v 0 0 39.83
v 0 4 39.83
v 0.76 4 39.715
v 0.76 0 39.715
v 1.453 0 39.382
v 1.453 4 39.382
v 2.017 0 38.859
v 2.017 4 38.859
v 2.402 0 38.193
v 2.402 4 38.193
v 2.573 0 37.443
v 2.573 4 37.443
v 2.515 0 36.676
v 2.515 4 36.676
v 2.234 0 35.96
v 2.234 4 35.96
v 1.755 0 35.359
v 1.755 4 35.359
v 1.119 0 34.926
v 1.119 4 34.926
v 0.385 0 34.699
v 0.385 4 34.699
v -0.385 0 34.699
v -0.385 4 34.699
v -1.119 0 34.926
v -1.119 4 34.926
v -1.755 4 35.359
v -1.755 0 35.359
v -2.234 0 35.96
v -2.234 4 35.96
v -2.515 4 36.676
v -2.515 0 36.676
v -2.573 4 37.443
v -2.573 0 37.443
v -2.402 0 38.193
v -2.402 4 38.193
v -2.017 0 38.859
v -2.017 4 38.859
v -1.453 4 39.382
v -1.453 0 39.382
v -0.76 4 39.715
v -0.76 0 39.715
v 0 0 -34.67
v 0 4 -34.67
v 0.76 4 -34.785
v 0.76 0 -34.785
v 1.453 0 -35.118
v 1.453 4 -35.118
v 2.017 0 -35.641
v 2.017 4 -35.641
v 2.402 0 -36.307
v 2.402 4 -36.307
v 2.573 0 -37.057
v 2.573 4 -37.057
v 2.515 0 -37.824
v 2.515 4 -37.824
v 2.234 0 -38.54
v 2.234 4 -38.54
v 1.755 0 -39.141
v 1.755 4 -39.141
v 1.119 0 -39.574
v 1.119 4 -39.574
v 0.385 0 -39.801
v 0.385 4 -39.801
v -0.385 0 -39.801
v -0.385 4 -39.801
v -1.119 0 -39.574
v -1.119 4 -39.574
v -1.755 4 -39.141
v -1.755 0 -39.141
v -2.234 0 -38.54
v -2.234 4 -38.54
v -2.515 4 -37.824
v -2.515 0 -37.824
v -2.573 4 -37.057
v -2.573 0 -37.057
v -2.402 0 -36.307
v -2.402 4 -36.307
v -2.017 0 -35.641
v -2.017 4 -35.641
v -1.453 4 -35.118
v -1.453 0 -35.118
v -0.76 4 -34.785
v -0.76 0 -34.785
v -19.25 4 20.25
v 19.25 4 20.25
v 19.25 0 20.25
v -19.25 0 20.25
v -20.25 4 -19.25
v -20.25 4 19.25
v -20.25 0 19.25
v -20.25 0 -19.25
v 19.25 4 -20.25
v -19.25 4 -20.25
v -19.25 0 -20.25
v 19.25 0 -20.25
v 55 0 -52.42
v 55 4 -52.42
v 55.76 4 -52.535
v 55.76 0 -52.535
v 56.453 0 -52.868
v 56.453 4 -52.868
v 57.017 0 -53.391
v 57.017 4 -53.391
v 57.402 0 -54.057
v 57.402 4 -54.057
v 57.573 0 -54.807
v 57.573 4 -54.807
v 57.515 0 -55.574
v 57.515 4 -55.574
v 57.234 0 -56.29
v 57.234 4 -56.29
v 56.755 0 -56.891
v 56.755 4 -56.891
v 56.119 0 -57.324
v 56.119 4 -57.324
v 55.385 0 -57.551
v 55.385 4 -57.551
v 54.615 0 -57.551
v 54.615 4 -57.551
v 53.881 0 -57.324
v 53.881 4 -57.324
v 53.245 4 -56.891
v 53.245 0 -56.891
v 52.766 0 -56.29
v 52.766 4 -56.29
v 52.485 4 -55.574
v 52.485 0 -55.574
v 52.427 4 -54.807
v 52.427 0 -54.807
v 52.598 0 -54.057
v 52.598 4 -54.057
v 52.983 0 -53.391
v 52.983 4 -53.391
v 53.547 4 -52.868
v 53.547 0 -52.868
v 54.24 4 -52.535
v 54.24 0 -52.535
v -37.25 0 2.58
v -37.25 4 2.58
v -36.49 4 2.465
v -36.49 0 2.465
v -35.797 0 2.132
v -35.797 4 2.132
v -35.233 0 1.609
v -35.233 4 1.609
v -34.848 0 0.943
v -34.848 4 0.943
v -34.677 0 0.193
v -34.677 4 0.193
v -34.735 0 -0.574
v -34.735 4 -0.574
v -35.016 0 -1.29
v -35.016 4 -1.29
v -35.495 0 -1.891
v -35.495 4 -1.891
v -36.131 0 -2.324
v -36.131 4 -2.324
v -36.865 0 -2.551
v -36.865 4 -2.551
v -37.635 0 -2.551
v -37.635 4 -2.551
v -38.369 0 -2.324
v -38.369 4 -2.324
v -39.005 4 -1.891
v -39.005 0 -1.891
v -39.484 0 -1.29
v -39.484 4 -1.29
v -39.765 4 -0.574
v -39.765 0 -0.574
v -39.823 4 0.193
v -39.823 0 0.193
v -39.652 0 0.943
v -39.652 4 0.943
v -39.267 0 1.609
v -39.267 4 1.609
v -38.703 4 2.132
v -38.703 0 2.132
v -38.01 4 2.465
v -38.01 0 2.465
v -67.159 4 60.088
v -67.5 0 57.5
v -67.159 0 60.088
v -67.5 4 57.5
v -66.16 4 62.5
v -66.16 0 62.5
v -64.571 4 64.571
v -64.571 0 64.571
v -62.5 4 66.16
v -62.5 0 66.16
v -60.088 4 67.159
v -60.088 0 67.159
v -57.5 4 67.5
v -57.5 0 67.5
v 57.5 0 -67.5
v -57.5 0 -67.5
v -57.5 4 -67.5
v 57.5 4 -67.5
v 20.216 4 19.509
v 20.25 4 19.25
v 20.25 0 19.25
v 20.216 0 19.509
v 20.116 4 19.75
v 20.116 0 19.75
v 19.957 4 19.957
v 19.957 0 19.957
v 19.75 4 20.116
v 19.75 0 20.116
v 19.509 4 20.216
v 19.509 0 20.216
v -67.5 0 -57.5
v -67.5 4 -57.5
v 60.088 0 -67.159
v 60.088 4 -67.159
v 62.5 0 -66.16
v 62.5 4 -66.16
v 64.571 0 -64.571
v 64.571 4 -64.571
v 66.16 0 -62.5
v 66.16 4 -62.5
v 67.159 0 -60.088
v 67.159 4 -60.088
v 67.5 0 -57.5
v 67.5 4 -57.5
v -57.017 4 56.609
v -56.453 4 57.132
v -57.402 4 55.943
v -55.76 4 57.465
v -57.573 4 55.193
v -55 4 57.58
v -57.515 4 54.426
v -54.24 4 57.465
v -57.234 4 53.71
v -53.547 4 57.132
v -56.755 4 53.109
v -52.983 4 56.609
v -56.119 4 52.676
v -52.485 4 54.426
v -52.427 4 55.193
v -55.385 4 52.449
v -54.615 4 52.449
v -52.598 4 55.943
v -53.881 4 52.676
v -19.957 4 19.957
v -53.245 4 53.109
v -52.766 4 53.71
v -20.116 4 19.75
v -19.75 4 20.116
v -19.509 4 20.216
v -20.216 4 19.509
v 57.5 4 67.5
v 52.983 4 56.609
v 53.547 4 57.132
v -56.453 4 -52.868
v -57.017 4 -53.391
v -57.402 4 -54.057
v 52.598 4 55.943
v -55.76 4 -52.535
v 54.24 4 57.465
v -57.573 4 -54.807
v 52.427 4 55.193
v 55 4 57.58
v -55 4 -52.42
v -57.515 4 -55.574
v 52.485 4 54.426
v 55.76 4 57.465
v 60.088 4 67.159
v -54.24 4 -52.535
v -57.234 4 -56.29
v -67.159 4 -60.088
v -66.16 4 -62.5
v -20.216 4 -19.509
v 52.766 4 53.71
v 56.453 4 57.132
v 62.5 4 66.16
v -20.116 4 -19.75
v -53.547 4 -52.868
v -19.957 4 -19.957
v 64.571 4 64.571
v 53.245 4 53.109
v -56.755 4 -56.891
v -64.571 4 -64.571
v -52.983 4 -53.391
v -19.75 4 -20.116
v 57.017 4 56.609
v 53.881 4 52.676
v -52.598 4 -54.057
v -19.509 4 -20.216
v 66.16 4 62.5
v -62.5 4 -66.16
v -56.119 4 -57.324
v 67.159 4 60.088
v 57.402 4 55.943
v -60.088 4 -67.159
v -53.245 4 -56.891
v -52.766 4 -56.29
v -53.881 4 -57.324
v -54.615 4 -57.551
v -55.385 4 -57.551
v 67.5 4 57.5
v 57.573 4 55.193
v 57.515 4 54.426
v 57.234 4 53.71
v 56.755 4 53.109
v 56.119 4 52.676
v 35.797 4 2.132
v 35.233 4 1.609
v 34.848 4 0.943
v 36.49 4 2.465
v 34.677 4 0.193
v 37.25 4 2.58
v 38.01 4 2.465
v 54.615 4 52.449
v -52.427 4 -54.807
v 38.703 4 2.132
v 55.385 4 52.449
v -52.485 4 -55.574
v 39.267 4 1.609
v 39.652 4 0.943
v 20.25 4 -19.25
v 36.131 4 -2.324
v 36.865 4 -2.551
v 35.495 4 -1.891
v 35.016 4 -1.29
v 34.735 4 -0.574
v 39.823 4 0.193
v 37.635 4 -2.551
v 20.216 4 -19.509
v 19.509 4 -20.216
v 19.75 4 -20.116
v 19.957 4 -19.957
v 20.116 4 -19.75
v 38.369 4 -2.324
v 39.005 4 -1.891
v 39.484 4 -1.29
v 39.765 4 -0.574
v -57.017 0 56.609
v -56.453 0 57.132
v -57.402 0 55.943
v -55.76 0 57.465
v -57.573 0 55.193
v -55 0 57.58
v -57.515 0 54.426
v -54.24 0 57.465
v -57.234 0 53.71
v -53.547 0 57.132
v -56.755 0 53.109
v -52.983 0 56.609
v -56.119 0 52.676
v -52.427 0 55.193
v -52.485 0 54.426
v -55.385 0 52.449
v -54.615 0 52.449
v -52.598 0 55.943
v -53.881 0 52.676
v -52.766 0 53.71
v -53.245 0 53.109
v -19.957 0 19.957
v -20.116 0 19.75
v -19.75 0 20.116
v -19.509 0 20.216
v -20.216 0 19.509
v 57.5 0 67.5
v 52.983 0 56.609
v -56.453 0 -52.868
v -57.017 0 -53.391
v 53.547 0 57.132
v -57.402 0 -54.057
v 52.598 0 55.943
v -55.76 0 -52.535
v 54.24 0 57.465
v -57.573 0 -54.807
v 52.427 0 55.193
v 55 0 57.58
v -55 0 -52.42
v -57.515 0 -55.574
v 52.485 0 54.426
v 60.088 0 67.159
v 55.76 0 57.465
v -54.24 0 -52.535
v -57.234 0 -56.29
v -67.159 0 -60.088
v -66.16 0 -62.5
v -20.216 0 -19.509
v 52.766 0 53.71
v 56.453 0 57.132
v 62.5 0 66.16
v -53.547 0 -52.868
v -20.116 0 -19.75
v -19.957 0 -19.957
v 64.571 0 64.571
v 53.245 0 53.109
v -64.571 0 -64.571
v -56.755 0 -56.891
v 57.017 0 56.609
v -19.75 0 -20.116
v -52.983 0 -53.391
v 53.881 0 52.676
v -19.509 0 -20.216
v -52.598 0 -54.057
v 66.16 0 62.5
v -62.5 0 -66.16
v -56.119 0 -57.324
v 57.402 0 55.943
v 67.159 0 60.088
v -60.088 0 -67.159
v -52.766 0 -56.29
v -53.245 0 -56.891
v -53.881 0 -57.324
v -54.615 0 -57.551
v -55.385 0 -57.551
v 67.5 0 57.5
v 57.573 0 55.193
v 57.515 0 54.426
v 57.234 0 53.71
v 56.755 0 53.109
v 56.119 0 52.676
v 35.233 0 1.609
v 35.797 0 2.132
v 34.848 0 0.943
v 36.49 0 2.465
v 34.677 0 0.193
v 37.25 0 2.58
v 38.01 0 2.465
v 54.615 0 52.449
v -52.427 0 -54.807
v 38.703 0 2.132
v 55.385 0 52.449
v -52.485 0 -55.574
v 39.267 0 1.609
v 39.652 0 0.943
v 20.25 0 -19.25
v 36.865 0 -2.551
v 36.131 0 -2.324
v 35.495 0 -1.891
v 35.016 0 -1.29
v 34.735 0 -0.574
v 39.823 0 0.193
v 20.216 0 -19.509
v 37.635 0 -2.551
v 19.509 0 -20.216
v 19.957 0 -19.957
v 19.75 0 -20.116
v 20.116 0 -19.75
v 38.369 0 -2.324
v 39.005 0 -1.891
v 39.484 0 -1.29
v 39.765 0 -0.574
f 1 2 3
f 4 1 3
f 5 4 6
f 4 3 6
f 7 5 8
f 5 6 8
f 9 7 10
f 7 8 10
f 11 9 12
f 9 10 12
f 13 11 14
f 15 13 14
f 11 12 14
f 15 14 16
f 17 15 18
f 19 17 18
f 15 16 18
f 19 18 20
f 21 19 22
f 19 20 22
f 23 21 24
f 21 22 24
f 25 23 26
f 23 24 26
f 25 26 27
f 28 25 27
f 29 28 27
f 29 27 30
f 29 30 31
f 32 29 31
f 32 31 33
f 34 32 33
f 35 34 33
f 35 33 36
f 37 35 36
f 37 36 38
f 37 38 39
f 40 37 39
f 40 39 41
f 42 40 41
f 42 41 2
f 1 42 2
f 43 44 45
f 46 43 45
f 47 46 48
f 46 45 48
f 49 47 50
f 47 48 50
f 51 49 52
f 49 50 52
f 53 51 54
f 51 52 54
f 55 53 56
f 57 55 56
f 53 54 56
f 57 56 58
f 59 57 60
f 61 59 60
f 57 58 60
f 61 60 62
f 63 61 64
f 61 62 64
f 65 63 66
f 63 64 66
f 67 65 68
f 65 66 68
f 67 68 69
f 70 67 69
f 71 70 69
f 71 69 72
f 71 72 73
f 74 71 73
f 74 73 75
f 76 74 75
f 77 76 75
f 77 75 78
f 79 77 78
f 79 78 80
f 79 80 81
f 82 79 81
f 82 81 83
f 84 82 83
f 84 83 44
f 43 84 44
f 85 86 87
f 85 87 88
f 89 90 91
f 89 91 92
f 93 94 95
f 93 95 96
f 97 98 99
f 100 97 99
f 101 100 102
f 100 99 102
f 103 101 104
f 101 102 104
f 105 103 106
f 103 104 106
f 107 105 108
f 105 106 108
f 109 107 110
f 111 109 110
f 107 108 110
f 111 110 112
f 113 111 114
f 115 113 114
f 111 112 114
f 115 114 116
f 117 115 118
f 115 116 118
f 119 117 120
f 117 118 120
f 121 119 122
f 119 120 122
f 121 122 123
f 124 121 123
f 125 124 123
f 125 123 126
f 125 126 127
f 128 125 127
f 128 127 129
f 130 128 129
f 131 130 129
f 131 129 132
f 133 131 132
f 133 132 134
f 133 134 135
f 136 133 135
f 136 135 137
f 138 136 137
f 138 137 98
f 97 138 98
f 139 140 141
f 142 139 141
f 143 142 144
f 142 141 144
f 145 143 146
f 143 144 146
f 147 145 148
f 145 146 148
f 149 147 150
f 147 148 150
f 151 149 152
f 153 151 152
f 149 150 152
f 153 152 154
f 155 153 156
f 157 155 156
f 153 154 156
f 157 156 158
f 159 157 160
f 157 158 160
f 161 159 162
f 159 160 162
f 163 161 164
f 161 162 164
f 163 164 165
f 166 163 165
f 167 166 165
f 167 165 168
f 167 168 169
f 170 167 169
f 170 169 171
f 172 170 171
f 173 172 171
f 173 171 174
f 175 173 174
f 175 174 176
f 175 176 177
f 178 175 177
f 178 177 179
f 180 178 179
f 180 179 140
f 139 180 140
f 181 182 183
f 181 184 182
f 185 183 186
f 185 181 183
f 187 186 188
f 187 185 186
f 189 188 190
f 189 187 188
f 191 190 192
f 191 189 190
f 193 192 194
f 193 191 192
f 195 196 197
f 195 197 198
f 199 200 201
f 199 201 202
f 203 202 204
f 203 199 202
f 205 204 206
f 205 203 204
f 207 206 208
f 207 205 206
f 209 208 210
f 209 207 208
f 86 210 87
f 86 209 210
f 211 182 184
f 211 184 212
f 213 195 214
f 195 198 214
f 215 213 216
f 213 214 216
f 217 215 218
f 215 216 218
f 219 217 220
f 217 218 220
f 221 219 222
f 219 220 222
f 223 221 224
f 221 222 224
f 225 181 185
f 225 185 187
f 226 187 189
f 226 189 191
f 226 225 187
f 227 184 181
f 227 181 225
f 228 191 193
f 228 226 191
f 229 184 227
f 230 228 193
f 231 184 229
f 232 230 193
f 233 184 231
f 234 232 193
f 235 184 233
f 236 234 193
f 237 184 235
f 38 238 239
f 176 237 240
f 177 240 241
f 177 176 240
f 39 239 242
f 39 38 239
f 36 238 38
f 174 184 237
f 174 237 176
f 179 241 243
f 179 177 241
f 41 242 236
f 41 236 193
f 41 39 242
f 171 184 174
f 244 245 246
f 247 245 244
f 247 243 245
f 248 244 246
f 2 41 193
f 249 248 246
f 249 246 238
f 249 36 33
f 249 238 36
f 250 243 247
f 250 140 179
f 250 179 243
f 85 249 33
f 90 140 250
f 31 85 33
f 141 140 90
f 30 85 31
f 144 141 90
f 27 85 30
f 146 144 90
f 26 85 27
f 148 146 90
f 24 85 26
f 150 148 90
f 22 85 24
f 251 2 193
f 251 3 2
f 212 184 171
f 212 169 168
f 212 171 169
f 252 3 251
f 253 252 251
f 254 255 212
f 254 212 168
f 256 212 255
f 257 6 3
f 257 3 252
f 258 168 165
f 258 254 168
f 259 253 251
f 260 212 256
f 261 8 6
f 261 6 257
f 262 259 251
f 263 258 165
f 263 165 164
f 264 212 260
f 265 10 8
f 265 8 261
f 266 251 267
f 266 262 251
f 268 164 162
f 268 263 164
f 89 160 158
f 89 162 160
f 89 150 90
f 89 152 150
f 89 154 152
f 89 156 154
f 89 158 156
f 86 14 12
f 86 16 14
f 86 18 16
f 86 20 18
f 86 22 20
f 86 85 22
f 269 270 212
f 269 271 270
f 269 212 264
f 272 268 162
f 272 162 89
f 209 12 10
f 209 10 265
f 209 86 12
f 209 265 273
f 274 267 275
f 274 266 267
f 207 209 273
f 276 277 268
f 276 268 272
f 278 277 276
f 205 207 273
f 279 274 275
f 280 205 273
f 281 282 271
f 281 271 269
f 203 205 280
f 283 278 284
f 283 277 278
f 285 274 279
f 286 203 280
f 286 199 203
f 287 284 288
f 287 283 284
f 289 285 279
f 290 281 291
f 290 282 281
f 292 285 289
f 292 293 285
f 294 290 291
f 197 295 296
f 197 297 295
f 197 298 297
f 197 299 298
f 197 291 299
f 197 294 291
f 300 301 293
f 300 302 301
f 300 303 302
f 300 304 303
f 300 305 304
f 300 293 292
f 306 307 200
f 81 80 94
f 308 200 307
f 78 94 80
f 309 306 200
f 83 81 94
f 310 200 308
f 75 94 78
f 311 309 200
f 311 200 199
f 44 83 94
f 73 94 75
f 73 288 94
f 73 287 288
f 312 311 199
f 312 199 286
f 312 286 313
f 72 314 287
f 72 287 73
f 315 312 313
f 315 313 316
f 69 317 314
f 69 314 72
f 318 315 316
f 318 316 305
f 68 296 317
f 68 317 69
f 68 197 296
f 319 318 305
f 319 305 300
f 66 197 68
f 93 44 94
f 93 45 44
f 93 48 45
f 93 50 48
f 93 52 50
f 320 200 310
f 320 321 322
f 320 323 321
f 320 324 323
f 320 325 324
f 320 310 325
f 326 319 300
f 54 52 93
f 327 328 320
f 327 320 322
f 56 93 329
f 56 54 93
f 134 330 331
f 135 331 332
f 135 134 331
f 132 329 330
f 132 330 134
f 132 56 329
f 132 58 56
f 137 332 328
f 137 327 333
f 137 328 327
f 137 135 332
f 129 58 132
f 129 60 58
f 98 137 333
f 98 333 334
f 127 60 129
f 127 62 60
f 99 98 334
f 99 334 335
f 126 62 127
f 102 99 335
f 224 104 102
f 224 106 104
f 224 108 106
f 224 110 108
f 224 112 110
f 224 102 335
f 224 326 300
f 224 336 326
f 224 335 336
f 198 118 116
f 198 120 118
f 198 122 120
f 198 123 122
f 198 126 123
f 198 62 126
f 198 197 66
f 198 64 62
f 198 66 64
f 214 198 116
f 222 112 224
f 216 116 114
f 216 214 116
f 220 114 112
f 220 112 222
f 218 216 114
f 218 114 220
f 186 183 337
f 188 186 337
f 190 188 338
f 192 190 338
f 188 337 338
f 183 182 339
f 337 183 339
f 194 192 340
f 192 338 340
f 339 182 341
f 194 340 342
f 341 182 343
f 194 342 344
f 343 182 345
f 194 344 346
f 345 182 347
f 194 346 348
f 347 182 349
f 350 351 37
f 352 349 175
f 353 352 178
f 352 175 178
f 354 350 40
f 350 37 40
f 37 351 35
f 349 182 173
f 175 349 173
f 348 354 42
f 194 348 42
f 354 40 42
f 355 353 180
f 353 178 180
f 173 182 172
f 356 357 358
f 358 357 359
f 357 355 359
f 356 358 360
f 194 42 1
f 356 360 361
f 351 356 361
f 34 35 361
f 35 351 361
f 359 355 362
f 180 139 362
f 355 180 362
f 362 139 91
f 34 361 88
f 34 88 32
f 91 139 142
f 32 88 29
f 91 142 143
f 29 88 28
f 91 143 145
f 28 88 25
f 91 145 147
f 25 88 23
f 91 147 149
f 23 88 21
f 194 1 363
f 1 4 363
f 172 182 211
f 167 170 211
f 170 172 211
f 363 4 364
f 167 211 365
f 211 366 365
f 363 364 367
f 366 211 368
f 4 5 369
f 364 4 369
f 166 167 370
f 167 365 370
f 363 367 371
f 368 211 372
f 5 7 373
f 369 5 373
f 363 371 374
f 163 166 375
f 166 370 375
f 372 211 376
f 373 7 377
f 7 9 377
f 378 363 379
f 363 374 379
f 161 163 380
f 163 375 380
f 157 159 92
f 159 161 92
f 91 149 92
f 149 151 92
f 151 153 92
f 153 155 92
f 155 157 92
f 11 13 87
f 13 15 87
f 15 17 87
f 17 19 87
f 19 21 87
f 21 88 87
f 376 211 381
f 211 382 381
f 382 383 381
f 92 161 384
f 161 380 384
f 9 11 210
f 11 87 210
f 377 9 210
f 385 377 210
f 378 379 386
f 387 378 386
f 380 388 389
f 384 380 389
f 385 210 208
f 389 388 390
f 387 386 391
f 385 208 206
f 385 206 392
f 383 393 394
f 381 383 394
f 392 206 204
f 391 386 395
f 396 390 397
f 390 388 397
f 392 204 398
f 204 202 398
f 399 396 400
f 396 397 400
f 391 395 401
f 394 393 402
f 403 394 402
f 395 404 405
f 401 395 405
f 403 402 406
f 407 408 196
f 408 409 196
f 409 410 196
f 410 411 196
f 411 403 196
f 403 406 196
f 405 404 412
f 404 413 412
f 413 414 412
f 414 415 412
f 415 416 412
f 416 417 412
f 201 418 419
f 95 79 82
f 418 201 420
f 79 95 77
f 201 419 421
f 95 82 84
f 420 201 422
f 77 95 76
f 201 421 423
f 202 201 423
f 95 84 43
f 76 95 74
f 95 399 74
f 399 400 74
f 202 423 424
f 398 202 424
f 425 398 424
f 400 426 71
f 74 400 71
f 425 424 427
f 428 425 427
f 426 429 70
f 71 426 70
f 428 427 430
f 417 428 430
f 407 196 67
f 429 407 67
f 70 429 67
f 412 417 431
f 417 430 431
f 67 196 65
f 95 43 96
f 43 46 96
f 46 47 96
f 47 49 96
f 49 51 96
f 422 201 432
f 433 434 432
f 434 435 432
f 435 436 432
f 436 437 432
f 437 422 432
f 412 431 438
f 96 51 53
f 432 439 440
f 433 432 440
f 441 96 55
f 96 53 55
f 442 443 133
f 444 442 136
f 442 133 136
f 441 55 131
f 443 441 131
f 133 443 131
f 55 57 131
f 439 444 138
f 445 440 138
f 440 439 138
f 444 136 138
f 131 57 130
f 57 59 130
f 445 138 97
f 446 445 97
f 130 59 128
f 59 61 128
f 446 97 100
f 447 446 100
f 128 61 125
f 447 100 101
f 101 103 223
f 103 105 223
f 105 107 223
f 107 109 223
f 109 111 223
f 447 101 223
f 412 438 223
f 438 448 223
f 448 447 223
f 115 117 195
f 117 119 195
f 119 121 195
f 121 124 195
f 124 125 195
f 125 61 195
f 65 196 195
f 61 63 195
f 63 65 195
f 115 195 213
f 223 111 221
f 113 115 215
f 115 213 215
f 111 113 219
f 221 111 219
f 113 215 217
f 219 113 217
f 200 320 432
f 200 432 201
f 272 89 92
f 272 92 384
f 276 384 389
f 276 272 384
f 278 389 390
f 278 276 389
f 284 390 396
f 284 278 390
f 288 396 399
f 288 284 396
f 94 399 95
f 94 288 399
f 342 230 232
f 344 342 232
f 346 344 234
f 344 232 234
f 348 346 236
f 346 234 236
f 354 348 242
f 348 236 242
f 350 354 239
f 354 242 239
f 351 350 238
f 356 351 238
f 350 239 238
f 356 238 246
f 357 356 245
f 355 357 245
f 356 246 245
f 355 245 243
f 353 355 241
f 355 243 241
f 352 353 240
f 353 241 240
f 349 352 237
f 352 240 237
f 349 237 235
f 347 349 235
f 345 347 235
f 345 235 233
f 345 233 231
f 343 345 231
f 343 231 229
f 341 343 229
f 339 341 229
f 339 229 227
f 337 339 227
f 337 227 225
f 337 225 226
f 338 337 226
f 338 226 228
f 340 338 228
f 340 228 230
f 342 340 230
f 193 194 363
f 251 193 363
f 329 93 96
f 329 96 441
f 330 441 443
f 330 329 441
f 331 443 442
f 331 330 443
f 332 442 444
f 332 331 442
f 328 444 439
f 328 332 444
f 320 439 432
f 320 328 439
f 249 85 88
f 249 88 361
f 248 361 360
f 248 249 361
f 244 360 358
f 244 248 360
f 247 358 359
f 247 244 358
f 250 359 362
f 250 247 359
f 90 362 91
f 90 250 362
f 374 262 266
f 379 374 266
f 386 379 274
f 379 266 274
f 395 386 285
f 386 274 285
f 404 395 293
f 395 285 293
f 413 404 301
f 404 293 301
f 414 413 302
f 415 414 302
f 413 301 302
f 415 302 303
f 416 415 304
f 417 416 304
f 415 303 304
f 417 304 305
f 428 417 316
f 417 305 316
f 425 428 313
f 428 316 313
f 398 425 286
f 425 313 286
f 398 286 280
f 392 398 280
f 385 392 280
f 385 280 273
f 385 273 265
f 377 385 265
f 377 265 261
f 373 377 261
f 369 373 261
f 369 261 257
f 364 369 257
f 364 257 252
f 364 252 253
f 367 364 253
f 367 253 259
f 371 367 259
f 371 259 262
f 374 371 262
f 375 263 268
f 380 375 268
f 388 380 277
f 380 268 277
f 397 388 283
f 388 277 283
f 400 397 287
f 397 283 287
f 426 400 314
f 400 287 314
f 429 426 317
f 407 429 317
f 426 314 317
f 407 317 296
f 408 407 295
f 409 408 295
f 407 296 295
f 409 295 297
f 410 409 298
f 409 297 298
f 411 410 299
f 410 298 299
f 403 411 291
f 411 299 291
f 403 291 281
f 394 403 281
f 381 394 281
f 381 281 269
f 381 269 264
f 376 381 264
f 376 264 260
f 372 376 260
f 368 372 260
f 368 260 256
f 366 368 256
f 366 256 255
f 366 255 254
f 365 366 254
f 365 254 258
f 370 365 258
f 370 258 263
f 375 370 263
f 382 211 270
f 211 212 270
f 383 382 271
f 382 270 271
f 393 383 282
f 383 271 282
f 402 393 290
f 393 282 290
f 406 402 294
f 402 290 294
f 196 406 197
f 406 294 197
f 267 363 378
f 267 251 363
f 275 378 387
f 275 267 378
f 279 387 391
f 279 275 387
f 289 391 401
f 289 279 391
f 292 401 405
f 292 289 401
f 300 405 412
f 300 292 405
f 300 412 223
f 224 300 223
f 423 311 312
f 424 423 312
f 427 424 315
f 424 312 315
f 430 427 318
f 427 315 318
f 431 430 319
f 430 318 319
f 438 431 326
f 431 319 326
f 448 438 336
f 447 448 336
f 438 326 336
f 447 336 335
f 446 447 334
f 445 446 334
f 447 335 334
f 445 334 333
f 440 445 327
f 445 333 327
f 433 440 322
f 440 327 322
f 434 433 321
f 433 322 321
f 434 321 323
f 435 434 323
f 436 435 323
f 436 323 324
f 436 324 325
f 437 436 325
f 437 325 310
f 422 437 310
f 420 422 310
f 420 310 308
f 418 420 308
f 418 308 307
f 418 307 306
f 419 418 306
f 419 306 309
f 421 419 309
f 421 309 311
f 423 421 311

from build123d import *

# Parameters (mm, degrees)
SKETCH1_W           = 135
SKETCH1_H           = 135
BOSS_EXTRUDE1_DEPTH = 4
CUT_EXTRUDE1_DEPTH  = 96.543183954
SKETCH5_R           = 2.58
CUT_EXTRUDE2_DEPTH  = 96.543183954
SKETCH6_R           = 2.58
CUT_EXTRUDE3_DEPTH  = 96.543183954
FILLET1_R           = 10


with BuildPart() as part:
    # Sketch1 → Boss-Extrude1 (new body)
    with BuildSketch(Plane(origin=(0, 0, 0), x_dir=(1, 0, 0), z_dir=(0, 1, 0))):
        Rectangle(SKETCH1_W, SKETCH1_H)
    extrude(amount=BOSS_EXTRUDE1_DEPTH)

    # Sketch4 → Cut-Extrude1 (cut, through all)
    with BuildSketch(Plane(origin=(0, 4, 0), x_dir=(1, 0, 0), z_dir=(0, 1, 0))):
        with BuildLine():
            Line((-19.25, 20.25), (19.25, 20.25))
            ThreePointArc((19.25, 20.25), (19.957106781, 19.957106781), (20.25, 19.25))
            Line((20.25, 19.25), (20.25, -19.25))
            ThreePointArc((20.25, -19.25), (19.957106781, -19.957106781), (19.25, -20.25))
            Line((19.25, -20.25), (-19.25, -20.25))
            ThreePointArc((-19.25, -20.25), (-19.957106781, -19.957106781), (-20.25, -19.25))
            Line((-20.25, -19.25), (-20.25, 19.25))
            ThreePointArc((-20.25, 19.25), (-19.957106781, 19.957106781), (-19.25, 20.25))
        make_face()
    extrude(amount=-CUT_EXTRUDE1_DEPTH, mode=Mode.SUBTRACT)

    # Sketch5 → Cut-Extrude2 (cut, through all)
    with BuildSketch(Plane(origin=(0, 4, 0), x_dir=(1, 0, 0), z_dir=(0, 1, 0))):
        with Locations(Location((-37.25, 0, 0), (0, 0, 270))):
            Circle(SKETCH5_R)
        with Locations(Location((0, 37.25, 0), (0, 0, 270))):
            Circle(SKETCH5_R)
        with Locations(Location((37.25, 0, 0), (0, 0, 270))):
            Circle(SKETCH5_R)
        with Locations(Location((0, -37.25, 0), (0, 0, 270))):
            Circle(SKETCH5_R)
    extrude(amount=-CUT_EXTRUDE2_DEPTH, mode=Mode.SUBTRACT)

    # Sketch6 → Cut-Extrude3 (cut, through all)
    with BuildSketch(Plane(origin=(0, 4, 0), x_dir=(1, 0, 0), z_dir=(0, 1, 0))):
        with Locations(Location((-55, 55, 0), (0, 0, 270))):
            Circle(SKETCH6_R)
        with Locations(Location((55, 55, 0), (0, 0, 270))):
            Circle(SKETCH6_R)
        with Locations(Location((55, -55, 0), (0, 0, 270))):
            Circle(SKETCH6_R)
        with Locations(Location((-55, -55, 0), (0, 0, 270))):
            Circle(SKETCH6_R)
    extrude(amount=-CUT_EXTRUDE3_DEPTH, mode=Mode.SUBTRACT)

    # Fillet1
    fillet1_edges = [part.edges().sort_by_distance(p)[0] for p in [
        (67.5, 2, 67.5),
        (-67.5, 2, 67.5),
        (-67.5, 2, -67.5),
        (67.5, 2, -67.5),
    ]]
    fillet(fillet1_edges, radius=FILLET1_R)


solid = part.part
